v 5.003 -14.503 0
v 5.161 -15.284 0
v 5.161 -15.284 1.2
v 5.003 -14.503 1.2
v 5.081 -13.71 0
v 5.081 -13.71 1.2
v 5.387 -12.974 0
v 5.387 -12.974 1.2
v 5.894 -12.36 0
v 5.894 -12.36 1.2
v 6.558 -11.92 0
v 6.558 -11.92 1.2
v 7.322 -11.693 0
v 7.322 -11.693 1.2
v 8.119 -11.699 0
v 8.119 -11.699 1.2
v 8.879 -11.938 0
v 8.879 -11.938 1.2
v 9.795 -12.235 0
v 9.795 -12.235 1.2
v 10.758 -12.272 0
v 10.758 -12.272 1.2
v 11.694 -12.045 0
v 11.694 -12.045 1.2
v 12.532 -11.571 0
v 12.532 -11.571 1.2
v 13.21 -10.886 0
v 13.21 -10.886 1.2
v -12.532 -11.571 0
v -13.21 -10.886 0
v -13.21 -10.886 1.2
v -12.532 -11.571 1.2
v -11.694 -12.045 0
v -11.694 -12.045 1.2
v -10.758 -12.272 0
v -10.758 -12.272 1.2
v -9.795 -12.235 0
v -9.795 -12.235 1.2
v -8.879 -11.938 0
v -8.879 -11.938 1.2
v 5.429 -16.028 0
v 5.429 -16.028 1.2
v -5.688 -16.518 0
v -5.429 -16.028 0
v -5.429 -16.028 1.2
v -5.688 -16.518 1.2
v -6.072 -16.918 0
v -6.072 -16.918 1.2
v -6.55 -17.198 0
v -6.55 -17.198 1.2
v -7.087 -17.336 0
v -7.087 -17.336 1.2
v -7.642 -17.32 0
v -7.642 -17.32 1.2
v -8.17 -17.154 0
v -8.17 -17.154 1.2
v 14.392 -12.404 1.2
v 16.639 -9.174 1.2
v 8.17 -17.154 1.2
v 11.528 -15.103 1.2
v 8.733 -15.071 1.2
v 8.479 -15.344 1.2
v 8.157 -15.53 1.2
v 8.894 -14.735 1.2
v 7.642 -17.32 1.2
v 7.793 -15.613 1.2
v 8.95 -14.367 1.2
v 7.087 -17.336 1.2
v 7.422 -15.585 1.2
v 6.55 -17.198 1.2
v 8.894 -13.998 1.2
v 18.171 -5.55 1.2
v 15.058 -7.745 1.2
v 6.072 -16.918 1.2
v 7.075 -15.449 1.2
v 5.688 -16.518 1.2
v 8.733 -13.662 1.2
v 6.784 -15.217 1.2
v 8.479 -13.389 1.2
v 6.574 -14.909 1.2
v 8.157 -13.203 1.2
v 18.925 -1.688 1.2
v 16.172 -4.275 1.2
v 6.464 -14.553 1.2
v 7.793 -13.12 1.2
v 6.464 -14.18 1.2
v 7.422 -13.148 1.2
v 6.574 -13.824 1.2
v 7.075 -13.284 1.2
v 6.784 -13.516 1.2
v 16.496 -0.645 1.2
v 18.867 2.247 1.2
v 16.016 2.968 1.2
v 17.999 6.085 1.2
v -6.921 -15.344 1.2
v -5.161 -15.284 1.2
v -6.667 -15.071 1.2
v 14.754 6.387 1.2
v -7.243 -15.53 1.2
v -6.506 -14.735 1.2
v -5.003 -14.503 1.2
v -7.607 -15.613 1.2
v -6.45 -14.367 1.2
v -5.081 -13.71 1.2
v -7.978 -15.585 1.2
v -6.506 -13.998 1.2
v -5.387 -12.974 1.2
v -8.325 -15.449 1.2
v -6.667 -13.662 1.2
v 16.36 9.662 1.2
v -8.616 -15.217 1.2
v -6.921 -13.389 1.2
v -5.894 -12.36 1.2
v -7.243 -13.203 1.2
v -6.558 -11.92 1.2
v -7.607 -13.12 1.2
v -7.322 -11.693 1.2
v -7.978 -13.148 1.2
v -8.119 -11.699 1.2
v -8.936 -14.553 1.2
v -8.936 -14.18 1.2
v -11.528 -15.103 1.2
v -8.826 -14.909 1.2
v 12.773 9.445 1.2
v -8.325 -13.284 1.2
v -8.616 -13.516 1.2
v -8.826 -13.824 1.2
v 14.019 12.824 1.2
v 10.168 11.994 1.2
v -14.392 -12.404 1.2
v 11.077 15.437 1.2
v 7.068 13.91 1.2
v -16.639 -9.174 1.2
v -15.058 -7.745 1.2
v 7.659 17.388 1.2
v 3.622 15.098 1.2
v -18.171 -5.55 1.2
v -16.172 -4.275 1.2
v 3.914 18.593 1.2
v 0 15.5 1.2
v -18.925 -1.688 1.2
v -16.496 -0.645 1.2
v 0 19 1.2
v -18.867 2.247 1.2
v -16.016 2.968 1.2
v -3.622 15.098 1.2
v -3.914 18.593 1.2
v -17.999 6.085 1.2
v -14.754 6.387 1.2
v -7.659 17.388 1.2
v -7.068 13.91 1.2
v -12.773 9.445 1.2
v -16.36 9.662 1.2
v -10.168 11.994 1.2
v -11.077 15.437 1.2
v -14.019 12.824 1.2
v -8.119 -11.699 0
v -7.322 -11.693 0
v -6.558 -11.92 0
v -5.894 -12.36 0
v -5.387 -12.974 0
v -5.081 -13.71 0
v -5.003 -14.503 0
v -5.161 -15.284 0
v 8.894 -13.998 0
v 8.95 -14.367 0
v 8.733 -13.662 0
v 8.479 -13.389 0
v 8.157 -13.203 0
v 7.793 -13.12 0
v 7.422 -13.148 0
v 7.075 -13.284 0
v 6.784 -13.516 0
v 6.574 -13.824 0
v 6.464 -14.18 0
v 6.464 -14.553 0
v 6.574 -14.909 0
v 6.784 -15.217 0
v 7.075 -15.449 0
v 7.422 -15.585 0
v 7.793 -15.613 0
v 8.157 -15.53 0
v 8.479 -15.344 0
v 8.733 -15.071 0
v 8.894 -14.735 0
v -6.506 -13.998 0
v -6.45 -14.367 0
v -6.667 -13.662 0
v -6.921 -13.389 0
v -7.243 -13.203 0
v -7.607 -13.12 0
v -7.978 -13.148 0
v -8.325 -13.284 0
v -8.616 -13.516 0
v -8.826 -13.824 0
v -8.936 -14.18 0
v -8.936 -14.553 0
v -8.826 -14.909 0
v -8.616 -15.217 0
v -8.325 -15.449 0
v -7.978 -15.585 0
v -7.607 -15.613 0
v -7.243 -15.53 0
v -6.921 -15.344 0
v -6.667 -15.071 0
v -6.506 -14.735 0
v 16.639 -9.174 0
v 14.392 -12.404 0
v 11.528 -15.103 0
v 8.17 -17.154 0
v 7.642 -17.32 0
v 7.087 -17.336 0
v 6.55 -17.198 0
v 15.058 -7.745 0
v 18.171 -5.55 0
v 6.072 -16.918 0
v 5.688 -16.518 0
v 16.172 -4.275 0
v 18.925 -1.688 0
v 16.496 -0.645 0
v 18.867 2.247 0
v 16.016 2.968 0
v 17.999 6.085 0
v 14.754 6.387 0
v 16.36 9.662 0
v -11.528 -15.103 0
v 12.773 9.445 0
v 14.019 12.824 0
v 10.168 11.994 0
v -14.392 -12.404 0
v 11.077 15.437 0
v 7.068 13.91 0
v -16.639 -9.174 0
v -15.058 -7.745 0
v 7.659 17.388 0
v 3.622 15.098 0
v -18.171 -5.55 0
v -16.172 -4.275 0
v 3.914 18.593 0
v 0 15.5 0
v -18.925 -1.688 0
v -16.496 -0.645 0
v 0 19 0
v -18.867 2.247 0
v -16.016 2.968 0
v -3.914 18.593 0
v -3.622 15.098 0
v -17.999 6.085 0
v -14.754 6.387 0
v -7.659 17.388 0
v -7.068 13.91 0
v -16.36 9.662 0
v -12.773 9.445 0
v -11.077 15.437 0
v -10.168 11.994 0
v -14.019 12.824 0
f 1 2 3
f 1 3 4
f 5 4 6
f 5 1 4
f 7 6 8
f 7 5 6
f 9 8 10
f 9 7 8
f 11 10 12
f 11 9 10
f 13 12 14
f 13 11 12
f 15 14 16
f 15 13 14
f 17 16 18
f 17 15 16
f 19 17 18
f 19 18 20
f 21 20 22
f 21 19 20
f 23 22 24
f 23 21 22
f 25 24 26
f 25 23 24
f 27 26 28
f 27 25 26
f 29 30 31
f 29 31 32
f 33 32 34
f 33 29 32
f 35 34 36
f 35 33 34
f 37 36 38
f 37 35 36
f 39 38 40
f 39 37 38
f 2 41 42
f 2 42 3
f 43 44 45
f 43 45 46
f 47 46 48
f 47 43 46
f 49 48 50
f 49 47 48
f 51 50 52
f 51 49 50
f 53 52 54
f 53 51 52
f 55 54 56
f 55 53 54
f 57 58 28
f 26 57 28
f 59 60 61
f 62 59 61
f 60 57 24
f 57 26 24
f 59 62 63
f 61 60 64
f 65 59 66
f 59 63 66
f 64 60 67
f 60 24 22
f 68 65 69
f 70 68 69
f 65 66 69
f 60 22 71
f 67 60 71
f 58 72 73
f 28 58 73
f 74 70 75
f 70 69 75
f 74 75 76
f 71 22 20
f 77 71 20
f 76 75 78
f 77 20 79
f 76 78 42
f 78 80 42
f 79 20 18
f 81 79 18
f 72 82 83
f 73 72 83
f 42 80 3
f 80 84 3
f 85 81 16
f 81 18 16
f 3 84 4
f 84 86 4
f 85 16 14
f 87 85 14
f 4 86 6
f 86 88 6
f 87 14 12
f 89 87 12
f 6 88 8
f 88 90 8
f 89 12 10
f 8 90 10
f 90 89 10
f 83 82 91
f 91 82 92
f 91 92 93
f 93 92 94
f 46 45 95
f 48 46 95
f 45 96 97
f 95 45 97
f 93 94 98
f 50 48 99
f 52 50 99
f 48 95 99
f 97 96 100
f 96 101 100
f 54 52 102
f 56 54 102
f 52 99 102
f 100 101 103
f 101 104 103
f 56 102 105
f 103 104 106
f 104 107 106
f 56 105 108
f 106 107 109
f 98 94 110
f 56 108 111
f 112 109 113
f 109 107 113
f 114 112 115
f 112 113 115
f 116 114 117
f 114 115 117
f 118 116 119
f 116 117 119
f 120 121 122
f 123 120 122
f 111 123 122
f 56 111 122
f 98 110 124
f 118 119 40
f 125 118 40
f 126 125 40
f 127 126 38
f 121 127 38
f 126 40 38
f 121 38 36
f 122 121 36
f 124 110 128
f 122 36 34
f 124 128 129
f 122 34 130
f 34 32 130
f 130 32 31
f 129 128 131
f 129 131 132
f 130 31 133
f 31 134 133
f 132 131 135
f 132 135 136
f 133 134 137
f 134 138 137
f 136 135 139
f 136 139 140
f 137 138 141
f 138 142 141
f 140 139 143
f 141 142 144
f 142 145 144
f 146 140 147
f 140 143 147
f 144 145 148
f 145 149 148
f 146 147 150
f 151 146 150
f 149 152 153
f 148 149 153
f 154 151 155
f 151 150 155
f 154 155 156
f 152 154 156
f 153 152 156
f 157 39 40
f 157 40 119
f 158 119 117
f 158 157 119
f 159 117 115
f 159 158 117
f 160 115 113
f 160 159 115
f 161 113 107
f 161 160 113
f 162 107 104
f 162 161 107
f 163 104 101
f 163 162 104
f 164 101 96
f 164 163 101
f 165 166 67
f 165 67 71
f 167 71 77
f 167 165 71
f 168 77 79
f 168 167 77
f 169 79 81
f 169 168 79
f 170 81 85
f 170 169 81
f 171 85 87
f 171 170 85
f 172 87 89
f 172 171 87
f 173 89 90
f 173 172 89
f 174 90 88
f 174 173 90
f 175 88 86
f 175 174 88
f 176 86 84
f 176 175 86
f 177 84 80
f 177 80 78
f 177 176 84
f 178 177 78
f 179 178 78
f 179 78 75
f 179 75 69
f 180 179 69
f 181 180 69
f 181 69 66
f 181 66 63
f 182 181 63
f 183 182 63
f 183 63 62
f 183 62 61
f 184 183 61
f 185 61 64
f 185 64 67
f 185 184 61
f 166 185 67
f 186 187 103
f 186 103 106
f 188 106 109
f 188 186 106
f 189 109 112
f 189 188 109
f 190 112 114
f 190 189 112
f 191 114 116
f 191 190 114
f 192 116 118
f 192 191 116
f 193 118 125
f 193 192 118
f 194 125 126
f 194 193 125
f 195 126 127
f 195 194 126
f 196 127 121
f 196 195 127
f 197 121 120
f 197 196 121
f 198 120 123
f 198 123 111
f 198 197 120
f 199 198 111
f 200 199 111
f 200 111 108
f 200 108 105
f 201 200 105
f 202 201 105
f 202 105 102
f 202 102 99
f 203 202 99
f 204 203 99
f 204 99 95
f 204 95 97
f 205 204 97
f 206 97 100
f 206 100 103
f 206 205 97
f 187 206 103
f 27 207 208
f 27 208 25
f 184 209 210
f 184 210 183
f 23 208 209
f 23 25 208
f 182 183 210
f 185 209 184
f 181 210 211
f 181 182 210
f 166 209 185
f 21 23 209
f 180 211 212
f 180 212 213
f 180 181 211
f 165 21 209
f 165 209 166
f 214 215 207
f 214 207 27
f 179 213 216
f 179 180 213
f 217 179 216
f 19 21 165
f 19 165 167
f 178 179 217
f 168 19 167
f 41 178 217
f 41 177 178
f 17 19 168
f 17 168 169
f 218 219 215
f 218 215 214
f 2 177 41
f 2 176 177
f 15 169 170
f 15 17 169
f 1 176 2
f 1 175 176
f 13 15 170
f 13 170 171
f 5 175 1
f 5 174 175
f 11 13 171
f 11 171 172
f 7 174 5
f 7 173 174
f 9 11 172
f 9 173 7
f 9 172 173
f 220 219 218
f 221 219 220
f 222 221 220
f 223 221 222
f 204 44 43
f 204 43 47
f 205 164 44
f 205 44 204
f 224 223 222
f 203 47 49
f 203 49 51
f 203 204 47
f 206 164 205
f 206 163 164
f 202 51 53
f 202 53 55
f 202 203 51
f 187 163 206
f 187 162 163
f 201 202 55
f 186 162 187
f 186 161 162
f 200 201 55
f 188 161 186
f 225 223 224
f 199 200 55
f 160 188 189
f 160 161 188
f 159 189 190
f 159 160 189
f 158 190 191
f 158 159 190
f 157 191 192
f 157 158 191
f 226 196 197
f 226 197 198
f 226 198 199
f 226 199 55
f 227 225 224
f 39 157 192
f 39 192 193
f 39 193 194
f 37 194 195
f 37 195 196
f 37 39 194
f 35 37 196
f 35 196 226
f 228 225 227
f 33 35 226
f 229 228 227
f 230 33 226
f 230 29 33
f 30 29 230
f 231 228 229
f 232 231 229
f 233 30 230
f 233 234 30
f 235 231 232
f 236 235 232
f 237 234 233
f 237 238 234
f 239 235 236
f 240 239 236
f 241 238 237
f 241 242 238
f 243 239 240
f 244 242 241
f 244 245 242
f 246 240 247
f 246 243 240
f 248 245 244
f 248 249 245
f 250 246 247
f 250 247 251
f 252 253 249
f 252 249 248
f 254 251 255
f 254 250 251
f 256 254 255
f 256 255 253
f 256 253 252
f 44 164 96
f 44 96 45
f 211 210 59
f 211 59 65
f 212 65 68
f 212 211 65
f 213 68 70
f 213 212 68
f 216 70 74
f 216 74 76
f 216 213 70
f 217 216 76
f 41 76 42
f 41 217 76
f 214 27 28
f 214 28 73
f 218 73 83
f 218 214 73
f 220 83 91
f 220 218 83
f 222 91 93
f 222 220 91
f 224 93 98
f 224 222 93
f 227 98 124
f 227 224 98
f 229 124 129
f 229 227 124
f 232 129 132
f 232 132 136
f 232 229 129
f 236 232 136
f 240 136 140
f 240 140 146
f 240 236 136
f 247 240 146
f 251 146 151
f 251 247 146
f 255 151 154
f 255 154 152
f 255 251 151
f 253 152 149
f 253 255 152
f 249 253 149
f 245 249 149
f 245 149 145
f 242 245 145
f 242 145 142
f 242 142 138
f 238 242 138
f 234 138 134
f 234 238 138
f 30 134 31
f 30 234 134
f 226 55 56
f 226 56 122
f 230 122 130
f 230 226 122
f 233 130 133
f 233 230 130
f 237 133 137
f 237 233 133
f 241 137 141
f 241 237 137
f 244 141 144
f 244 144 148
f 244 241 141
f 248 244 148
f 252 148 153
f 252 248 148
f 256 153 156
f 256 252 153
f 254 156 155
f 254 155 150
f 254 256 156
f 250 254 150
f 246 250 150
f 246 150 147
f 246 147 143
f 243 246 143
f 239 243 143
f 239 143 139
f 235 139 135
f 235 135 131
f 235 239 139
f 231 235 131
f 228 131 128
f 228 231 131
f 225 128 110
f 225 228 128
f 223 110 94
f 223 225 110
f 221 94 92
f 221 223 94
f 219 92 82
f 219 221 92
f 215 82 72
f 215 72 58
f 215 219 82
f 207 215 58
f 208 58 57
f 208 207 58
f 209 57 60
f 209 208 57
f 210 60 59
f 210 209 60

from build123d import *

# Parameters (mm, degrees)
SKETCH_1_R      = 1.25
EXTRUDE_1_DEPTH = 1.2


with BuildPart() as part:
    # Эскиз1 → Бобышка-Вытянуть1 (new body)
    with BuildSketch(Plane.XY):
        with BuildLine():
            Line((-5.160647232, -15.284063293), (-5.429258829, -16.027548533))
            ThreePointArc((-5.429258829, -16.027548533), (-6.550261386, -17.197940013), (-8.170291571, -17.153609989))
            ThreePointArc((-8.170291571, -17.153609989), (0, 19), (8.170291571, -17.153609989))
            ThreePointArc((8.170291571, -17.153609989), (6.550261386, -17.197940013), (5.429258829, -16.027548533))
            Line((5.429258829, -16.027548533), (5.160647232, -15.284063293))
            ThreePointArc((5.160647232, -15.284063293), (5.893948192, -12.359596142), (8.879298744, -11.937789906))
            ThreePointArc((8.879298744, -11.937789906), (11.233706363, -12.19050777), (13.210178389, -10.88641426))
            ThreePointArc((13.210178389, -10.88641426), (0, 15.5), (-13.210178389, -10.88641426))
            ThreePointArc((-13.210178389, -10.88641426), (-11.233706363, -12.19050777), (-8.879298744, -11.937789906))
            ThreePointArc((-8.879298744, -11.937789906), (-5.893948192, -12.359596142), (-5.160647232, -15.284063293))
        make_face()
        with Locations((-7.7, -14.366627997)):
            Circle(SKETCH_1_R, mode=Mode.SUBTRACT)
        with Locations((7.7, -14.366627997)):
            Circle(SKETCH_1_R, mode=Mode.SUBTRACT)
    extrude(amount=EXTRUDE_1_DEPTH)


solid = part.part
